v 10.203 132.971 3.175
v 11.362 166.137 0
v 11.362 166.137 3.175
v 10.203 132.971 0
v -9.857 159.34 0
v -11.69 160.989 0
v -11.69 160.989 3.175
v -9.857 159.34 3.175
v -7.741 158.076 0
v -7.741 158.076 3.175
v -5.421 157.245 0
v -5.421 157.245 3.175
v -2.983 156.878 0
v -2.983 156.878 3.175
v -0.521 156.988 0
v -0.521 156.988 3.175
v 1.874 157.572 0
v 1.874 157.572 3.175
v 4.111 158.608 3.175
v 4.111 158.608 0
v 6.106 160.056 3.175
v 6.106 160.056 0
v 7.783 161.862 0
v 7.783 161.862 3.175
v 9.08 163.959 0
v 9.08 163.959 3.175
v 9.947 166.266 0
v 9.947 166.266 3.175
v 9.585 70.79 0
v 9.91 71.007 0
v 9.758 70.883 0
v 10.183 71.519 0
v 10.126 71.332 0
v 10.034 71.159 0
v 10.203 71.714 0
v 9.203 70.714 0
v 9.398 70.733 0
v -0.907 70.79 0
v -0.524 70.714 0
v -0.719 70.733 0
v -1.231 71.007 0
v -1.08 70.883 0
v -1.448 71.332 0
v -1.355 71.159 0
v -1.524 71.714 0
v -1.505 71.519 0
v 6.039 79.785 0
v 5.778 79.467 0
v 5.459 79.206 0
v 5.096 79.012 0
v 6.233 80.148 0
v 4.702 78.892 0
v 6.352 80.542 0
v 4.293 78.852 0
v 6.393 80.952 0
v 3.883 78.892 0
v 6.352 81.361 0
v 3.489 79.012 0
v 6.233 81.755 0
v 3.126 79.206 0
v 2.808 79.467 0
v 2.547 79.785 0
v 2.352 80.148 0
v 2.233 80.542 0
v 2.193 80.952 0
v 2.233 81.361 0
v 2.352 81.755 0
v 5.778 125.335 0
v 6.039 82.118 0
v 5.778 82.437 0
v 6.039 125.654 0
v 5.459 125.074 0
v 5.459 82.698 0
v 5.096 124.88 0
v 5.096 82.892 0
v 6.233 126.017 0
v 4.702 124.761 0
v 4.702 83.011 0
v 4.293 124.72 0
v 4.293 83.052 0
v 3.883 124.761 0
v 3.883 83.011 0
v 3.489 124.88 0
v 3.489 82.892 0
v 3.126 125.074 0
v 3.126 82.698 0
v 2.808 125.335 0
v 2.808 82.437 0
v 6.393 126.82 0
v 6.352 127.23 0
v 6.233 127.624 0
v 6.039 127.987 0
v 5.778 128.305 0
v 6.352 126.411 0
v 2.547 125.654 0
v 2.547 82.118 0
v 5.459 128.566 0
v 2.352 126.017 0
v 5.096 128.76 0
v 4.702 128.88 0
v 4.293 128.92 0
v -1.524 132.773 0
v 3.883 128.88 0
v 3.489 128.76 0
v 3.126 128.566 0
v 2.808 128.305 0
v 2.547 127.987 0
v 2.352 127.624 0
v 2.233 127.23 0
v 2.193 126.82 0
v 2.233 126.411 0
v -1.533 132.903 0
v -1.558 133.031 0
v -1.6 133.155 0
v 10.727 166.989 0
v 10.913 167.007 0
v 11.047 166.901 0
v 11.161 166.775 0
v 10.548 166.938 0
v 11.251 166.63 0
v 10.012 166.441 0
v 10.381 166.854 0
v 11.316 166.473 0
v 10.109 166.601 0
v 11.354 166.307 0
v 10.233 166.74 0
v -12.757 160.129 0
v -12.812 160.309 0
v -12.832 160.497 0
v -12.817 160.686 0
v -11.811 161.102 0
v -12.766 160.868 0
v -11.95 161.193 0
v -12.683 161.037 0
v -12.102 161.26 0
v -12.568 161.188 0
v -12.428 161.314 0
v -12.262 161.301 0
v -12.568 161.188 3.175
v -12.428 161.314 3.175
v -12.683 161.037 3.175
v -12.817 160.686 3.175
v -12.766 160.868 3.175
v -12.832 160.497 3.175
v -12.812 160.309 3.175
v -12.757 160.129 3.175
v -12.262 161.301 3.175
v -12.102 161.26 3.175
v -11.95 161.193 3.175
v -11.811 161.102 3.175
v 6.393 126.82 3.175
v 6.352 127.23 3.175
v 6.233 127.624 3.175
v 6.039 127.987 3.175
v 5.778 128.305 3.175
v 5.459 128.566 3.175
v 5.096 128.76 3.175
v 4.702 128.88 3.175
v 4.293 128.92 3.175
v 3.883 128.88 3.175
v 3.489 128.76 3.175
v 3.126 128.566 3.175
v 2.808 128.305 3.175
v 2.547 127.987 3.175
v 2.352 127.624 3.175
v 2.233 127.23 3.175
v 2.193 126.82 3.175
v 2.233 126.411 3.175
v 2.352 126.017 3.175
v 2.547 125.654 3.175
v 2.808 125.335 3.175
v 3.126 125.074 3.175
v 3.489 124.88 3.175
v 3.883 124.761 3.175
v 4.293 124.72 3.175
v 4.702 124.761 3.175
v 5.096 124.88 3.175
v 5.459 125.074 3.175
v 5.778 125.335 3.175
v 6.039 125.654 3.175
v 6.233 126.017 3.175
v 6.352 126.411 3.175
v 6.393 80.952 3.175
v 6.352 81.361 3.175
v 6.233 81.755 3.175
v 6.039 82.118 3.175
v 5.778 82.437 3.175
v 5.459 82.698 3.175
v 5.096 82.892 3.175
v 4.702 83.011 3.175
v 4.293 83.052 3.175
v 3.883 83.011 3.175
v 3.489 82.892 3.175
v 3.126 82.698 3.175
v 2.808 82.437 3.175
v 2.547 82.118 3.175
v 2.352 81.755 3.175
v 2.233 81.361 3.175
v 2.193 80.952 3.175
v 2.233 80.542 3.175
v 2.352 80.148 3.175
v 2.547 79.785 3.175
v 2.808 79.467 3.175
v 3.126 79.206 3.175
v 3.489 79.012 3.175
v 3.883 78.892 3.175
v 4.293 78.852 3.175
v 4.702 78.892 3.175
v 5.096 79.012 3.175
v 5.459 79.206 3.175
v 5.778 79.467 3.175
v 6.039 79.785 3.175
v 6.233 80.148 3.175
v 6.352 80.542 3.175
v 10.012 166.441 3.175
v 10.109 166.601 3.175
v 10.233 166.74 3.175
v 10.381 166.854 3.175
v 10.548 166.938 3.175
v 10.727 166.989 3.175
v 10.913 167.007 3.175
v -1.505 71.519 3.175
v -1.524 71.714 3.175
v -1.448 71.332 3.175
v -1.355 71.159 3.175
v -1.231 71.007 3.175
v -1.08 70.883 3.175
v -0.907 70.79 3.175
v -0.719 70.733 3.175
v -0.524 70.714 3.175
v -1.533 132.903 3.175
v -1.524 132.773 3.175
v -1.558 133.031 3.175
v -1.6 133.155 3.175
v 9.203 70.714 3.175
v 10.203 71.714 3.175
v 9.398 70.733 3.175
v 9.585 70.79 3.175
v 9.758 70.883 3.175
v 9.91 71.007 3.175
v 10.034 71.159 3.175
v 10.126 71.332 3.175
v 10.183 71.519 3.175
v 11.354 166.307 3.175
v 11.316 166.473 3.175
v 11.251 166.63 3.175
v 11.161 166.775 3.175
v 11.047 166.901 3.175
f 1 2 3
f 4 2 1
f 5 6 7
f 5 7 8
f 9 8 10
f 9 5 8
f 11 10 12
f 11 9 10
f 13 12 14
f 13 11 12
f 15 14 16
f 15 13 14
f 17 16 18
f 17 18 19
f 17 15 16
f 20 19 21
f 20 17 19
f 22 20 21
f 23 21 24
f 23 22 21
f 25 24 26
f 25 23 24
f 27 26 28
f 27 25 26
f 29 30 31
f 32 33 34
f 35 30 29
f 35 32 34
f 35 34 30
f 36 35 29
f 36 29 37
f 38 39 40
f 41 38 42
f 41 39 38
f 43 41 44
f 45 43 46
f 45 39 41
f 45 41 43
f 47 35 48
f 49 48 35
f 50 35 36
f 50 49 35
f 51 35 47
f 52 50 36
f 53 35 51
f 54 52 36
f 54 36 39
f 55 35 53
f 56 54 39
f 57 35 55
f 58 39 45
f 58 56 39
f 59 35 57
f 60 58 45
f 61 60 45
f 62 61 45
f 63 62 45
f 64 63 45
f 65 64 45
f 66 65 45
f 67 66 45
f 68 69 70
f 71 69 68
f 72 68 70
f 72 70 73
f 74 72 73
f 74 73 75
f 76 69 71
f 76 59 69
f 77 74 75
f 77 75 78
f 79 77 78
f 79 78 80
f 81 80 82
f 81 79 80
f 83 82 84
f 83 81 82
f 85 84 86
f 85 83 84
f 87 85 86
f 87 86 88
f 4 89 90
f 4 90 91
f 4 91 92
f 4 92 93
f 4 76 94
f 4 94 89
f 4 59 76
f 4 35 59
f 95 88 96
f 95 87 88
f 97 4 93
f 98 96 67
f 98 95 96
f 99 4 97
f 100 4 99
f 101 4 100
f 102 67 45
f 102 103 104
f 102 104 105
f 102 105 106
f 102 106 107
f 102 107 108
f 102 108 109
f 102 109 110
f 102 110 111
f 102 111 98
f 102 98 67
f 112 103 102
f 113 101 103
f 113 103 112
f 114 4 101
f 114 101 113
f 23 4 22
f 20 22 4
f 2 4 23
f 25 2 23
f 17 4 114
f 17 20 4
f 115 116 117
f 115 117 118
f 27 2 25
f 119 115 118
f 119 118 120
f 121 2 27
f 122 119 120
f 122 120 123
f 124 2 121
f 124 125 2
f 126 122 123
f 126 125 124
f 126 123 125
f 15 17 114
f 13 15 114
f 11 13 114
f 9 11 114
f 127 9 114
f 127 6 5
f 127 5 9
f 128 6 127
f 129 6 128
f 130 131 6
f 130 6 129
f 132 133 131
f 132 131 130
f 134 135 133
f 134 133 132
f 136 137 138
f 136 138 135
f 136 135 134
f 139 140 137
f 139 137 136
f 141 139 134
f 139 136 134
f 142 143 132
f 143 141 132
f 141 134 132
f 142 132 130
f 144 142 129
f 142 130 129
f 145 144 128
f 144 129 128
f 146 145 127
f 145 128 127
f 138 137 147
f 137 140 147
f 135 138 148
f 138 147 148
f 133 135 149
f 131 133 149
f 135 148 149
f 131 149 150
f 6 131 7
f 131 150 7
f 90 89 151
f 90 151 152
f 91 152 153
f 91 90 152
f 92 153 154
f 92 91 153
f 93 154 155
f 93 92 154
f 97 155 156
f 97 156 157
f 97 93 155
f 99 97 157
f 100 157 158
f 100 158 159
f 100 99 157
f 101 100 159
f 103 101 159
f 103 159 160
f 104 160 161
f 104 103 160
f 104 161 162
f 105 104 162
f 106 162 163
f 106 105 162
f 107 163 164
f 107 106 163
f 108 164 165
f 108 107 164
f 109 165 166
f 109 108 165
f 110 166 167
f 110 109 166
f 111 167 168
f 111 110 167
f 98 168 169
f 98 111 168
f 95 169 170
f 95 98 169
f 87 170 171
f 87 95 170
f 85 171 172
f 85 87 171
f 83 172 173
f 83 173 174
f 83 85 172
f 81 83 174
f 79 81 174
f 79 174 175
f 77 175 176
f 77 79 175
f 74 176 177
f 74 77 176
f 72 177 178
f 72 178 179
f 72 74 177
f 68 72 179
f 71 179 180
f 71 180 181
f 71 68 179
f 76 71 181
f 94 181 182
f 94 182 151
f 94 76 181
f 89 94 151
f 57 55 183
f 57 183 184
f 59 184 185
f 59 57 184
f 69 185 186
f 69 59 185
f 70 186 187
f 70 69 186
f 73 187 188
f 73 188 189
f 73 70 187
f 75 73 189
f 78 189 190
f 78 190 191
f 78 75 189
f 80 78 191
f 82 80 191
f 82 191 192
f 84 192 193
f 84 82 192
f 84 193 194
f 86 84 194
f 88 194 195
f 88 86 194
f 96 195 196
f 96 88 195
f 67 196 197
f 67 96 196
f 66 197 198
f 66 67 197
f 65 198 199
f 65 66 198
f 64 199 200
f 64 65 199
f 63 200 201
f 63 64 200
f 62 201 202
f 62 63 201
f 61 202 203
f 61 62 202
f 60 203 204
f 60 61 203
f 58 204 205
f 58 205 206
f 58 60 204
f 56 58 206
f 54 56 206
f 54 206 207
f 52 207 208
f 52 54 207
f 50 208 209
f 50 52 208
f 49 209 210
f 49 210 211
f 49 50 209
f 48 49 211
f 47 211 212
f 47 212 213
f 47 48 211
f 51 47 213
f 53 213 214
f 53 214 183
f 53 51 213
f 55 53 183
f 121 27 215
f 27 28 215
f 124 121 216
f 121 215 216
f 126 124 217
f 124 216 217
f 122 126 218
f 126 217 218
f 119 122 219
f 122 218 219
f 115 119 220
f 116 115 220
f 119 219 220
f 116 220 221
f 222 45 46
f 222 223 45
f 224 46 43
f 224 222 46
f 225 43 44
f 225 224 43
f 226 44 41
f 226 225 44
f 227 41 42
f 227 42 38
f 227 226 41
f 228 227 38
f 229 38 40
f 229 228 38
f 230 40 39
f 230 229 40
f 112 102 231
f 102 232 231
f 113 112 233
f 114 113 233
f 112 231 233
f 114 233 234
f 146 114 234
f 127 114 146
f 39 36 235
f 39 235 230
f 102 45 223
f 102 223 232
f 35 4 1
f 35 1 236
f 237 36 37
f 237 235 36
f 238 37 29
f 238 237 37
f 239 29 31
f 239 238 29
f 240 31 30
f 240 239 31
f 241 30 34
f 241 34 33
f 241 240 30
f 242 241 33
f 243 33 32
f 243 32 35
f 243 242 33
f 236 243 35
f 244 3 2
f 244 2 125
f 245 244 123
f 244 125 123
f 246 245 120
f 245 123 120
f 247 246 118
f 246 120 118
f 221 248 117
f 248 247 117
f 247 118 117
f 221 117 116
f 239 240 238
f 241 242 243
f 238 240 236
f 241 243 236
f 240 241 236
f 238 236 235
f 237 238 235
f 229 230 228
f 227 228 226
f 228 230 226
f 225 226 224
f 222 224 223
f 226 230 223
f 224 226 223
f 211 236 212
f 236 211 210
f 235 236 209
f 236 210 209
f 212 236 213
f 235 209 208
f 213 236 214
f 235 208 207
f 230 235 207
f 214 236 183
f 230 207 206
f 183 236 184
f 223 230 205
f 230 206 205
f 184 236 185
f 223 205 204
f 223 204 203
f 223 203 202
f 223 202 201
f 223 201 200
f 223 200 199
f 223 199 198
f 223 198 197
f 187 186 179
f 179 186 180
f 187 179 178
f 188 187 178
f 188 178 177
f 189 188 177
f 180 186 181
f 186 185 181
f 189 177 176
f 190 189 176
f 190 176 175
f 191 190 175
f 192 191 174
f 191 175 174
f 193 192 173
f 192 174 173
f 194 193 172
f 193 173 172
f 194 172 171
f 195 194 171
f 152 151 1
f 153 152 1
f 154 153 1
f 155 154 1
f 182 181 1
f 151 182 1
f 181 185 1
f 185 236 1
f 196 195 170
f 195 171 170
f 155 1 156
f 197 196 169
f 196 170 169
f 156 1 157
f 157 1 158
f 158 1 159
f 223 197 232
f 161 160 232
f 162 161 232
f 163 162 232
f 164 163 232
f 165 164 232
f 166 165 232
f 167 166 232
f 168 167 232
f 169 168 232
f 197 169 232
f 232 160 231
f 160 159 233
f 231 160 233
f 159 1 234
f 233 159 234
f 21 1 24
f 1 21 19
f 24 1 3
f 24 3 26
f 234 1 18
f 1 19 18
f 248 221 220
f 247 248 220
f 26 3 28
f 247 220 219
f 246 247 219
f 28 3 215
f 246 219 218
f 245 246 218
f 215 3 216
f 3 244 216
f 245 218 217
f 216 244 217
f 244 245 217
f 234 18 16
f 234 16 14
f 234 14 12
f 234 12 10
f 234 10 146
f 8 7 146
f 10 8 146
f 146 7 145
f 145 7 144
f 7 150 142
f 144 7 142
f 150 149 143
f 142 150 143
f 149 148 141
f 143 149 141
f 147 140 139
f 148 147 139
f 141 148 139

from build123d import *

# Parameters (mm, degrees)
SKETCH1_R           = 2.1
BOSS_EXTRUDE1_DEPTH = 3.175
FILLET2_R           = 1
FILLET3_R           = 1


with BuildPart() as part:
    # Sketch1 → Boss-Extrude1 (new body)
    with BuildSketch(Plane.XY):
        with BuildLine():
            Line((7.553744451, 70.714270531), (-1.524, 70.714270531))
            Line((-1.524, 70.714270531), (-1.524, 132.971298819))
            Line((-1.524, 132.971298819), (-13.246972093, 161.314442451))
            Line((-13.246972093, 161.314442451), (-11.976972093, 161.314442451))
            ThreePointArc((-11.976972093, 161.314442451), (0.849692503, 157.261830841), (10.122503099, 167.006674049))
            Line((10.122503099, 167.006674049), (11.392503099, 167.006674049))
            Line((11.392503099, 167.006674049), (10.2026, 132.971298819))
            Line((10.2026, 132.971298819), (10.2026, 70.714270531))
            Line((10.2026, 70.714270531), (7.553744451, 70.714270531))
        make_face()
        with Locations((4.2926, 126.820276743)):
            Circle(SKETCH1_R, mode=Mode.SUBTRACT)
        with Locations((4.2926, 80.951718801)):
            Circle(SKETCH1_R, mode=Mode.SUBTRACT)
    extrude(amount=BOSS_EXTRUDE1_DEPTH)

    # Fillet2
    fillet2_edges = [part.edges().sort_by_distance(p)[0] for p in [
        (-11.976972093, 161.314442451, 1.5875),
        (10.122503099, 167.006674049, 1.5875),
        (10.2026, 70.714270531, 1.5875),
        (-1.524, 70.714270531, 1.5875),
        (-1.524, 132.971298819, 1.5875),
    ]]
    fillet(fillet2_edges, radius=FILLET2_R)

    # Fillet3
    # the kernel refuses this fillet: 1 mm, written as the material it takes off along each edge
    with BuildSketch(Plane(origin=(-13.246972093, 161.314442451, -3.208100544), x_dir=(1, 0, 0), z_dir=(0, 0, 1))) as fillet3_piece_1:
        with BuildLine():
            CenterArc((1.414539547, -0.803606449), FILLET3_R, 126.524113779, 75.946301344)
            Line((0.490462538, -1.185812782), (0.471980998, -1.193456909))
            Line((0.471980998, -1.193456909), (-0.01848154, -0.007644127))
            Line((-0.01848154, -0.007644127), (0, 0.02))
            ThreePointArc((0, 0.02), (0.409689249, 0.02), (0.807475277, 0.016072129))
            Line((0.807475277, 0.016072129), (0.819378498, 0))
        make_face()
    extrude(amount=9.591201087, mode=Mode.SUBTRACT)
    with BuildSketch(Plane(origin=(11.392503099, 167.006674049, -2.176149378), x_dir=(-1, 0, 0), z_dir=(0, 0, 1))) as fillet3_piece_2:
        with BuildLine():
            CenterArc((1.029802799, 0.834988847), FILLET3_R, 177.997710642, 58.616966228)
            Line((0.030413367, 0.869928276), (0.010425578, 0.870627065))
            Line((0.010425578, 0.870627065), (-0.019987789, 0.000698789))
            Line((-0.019987789, 0.000698789), (0, -0.02))
            ThreePointArc((0, -0.02), (0.239767965, -0.02), (0.468530594, -0.016699777))
            Line((0.468530594, -0.016699777), (0.479535931, 0))
        make_face()
    extrude(amount=7.527298756, mode=Mode.SUBTRACT)


solid = part.part
